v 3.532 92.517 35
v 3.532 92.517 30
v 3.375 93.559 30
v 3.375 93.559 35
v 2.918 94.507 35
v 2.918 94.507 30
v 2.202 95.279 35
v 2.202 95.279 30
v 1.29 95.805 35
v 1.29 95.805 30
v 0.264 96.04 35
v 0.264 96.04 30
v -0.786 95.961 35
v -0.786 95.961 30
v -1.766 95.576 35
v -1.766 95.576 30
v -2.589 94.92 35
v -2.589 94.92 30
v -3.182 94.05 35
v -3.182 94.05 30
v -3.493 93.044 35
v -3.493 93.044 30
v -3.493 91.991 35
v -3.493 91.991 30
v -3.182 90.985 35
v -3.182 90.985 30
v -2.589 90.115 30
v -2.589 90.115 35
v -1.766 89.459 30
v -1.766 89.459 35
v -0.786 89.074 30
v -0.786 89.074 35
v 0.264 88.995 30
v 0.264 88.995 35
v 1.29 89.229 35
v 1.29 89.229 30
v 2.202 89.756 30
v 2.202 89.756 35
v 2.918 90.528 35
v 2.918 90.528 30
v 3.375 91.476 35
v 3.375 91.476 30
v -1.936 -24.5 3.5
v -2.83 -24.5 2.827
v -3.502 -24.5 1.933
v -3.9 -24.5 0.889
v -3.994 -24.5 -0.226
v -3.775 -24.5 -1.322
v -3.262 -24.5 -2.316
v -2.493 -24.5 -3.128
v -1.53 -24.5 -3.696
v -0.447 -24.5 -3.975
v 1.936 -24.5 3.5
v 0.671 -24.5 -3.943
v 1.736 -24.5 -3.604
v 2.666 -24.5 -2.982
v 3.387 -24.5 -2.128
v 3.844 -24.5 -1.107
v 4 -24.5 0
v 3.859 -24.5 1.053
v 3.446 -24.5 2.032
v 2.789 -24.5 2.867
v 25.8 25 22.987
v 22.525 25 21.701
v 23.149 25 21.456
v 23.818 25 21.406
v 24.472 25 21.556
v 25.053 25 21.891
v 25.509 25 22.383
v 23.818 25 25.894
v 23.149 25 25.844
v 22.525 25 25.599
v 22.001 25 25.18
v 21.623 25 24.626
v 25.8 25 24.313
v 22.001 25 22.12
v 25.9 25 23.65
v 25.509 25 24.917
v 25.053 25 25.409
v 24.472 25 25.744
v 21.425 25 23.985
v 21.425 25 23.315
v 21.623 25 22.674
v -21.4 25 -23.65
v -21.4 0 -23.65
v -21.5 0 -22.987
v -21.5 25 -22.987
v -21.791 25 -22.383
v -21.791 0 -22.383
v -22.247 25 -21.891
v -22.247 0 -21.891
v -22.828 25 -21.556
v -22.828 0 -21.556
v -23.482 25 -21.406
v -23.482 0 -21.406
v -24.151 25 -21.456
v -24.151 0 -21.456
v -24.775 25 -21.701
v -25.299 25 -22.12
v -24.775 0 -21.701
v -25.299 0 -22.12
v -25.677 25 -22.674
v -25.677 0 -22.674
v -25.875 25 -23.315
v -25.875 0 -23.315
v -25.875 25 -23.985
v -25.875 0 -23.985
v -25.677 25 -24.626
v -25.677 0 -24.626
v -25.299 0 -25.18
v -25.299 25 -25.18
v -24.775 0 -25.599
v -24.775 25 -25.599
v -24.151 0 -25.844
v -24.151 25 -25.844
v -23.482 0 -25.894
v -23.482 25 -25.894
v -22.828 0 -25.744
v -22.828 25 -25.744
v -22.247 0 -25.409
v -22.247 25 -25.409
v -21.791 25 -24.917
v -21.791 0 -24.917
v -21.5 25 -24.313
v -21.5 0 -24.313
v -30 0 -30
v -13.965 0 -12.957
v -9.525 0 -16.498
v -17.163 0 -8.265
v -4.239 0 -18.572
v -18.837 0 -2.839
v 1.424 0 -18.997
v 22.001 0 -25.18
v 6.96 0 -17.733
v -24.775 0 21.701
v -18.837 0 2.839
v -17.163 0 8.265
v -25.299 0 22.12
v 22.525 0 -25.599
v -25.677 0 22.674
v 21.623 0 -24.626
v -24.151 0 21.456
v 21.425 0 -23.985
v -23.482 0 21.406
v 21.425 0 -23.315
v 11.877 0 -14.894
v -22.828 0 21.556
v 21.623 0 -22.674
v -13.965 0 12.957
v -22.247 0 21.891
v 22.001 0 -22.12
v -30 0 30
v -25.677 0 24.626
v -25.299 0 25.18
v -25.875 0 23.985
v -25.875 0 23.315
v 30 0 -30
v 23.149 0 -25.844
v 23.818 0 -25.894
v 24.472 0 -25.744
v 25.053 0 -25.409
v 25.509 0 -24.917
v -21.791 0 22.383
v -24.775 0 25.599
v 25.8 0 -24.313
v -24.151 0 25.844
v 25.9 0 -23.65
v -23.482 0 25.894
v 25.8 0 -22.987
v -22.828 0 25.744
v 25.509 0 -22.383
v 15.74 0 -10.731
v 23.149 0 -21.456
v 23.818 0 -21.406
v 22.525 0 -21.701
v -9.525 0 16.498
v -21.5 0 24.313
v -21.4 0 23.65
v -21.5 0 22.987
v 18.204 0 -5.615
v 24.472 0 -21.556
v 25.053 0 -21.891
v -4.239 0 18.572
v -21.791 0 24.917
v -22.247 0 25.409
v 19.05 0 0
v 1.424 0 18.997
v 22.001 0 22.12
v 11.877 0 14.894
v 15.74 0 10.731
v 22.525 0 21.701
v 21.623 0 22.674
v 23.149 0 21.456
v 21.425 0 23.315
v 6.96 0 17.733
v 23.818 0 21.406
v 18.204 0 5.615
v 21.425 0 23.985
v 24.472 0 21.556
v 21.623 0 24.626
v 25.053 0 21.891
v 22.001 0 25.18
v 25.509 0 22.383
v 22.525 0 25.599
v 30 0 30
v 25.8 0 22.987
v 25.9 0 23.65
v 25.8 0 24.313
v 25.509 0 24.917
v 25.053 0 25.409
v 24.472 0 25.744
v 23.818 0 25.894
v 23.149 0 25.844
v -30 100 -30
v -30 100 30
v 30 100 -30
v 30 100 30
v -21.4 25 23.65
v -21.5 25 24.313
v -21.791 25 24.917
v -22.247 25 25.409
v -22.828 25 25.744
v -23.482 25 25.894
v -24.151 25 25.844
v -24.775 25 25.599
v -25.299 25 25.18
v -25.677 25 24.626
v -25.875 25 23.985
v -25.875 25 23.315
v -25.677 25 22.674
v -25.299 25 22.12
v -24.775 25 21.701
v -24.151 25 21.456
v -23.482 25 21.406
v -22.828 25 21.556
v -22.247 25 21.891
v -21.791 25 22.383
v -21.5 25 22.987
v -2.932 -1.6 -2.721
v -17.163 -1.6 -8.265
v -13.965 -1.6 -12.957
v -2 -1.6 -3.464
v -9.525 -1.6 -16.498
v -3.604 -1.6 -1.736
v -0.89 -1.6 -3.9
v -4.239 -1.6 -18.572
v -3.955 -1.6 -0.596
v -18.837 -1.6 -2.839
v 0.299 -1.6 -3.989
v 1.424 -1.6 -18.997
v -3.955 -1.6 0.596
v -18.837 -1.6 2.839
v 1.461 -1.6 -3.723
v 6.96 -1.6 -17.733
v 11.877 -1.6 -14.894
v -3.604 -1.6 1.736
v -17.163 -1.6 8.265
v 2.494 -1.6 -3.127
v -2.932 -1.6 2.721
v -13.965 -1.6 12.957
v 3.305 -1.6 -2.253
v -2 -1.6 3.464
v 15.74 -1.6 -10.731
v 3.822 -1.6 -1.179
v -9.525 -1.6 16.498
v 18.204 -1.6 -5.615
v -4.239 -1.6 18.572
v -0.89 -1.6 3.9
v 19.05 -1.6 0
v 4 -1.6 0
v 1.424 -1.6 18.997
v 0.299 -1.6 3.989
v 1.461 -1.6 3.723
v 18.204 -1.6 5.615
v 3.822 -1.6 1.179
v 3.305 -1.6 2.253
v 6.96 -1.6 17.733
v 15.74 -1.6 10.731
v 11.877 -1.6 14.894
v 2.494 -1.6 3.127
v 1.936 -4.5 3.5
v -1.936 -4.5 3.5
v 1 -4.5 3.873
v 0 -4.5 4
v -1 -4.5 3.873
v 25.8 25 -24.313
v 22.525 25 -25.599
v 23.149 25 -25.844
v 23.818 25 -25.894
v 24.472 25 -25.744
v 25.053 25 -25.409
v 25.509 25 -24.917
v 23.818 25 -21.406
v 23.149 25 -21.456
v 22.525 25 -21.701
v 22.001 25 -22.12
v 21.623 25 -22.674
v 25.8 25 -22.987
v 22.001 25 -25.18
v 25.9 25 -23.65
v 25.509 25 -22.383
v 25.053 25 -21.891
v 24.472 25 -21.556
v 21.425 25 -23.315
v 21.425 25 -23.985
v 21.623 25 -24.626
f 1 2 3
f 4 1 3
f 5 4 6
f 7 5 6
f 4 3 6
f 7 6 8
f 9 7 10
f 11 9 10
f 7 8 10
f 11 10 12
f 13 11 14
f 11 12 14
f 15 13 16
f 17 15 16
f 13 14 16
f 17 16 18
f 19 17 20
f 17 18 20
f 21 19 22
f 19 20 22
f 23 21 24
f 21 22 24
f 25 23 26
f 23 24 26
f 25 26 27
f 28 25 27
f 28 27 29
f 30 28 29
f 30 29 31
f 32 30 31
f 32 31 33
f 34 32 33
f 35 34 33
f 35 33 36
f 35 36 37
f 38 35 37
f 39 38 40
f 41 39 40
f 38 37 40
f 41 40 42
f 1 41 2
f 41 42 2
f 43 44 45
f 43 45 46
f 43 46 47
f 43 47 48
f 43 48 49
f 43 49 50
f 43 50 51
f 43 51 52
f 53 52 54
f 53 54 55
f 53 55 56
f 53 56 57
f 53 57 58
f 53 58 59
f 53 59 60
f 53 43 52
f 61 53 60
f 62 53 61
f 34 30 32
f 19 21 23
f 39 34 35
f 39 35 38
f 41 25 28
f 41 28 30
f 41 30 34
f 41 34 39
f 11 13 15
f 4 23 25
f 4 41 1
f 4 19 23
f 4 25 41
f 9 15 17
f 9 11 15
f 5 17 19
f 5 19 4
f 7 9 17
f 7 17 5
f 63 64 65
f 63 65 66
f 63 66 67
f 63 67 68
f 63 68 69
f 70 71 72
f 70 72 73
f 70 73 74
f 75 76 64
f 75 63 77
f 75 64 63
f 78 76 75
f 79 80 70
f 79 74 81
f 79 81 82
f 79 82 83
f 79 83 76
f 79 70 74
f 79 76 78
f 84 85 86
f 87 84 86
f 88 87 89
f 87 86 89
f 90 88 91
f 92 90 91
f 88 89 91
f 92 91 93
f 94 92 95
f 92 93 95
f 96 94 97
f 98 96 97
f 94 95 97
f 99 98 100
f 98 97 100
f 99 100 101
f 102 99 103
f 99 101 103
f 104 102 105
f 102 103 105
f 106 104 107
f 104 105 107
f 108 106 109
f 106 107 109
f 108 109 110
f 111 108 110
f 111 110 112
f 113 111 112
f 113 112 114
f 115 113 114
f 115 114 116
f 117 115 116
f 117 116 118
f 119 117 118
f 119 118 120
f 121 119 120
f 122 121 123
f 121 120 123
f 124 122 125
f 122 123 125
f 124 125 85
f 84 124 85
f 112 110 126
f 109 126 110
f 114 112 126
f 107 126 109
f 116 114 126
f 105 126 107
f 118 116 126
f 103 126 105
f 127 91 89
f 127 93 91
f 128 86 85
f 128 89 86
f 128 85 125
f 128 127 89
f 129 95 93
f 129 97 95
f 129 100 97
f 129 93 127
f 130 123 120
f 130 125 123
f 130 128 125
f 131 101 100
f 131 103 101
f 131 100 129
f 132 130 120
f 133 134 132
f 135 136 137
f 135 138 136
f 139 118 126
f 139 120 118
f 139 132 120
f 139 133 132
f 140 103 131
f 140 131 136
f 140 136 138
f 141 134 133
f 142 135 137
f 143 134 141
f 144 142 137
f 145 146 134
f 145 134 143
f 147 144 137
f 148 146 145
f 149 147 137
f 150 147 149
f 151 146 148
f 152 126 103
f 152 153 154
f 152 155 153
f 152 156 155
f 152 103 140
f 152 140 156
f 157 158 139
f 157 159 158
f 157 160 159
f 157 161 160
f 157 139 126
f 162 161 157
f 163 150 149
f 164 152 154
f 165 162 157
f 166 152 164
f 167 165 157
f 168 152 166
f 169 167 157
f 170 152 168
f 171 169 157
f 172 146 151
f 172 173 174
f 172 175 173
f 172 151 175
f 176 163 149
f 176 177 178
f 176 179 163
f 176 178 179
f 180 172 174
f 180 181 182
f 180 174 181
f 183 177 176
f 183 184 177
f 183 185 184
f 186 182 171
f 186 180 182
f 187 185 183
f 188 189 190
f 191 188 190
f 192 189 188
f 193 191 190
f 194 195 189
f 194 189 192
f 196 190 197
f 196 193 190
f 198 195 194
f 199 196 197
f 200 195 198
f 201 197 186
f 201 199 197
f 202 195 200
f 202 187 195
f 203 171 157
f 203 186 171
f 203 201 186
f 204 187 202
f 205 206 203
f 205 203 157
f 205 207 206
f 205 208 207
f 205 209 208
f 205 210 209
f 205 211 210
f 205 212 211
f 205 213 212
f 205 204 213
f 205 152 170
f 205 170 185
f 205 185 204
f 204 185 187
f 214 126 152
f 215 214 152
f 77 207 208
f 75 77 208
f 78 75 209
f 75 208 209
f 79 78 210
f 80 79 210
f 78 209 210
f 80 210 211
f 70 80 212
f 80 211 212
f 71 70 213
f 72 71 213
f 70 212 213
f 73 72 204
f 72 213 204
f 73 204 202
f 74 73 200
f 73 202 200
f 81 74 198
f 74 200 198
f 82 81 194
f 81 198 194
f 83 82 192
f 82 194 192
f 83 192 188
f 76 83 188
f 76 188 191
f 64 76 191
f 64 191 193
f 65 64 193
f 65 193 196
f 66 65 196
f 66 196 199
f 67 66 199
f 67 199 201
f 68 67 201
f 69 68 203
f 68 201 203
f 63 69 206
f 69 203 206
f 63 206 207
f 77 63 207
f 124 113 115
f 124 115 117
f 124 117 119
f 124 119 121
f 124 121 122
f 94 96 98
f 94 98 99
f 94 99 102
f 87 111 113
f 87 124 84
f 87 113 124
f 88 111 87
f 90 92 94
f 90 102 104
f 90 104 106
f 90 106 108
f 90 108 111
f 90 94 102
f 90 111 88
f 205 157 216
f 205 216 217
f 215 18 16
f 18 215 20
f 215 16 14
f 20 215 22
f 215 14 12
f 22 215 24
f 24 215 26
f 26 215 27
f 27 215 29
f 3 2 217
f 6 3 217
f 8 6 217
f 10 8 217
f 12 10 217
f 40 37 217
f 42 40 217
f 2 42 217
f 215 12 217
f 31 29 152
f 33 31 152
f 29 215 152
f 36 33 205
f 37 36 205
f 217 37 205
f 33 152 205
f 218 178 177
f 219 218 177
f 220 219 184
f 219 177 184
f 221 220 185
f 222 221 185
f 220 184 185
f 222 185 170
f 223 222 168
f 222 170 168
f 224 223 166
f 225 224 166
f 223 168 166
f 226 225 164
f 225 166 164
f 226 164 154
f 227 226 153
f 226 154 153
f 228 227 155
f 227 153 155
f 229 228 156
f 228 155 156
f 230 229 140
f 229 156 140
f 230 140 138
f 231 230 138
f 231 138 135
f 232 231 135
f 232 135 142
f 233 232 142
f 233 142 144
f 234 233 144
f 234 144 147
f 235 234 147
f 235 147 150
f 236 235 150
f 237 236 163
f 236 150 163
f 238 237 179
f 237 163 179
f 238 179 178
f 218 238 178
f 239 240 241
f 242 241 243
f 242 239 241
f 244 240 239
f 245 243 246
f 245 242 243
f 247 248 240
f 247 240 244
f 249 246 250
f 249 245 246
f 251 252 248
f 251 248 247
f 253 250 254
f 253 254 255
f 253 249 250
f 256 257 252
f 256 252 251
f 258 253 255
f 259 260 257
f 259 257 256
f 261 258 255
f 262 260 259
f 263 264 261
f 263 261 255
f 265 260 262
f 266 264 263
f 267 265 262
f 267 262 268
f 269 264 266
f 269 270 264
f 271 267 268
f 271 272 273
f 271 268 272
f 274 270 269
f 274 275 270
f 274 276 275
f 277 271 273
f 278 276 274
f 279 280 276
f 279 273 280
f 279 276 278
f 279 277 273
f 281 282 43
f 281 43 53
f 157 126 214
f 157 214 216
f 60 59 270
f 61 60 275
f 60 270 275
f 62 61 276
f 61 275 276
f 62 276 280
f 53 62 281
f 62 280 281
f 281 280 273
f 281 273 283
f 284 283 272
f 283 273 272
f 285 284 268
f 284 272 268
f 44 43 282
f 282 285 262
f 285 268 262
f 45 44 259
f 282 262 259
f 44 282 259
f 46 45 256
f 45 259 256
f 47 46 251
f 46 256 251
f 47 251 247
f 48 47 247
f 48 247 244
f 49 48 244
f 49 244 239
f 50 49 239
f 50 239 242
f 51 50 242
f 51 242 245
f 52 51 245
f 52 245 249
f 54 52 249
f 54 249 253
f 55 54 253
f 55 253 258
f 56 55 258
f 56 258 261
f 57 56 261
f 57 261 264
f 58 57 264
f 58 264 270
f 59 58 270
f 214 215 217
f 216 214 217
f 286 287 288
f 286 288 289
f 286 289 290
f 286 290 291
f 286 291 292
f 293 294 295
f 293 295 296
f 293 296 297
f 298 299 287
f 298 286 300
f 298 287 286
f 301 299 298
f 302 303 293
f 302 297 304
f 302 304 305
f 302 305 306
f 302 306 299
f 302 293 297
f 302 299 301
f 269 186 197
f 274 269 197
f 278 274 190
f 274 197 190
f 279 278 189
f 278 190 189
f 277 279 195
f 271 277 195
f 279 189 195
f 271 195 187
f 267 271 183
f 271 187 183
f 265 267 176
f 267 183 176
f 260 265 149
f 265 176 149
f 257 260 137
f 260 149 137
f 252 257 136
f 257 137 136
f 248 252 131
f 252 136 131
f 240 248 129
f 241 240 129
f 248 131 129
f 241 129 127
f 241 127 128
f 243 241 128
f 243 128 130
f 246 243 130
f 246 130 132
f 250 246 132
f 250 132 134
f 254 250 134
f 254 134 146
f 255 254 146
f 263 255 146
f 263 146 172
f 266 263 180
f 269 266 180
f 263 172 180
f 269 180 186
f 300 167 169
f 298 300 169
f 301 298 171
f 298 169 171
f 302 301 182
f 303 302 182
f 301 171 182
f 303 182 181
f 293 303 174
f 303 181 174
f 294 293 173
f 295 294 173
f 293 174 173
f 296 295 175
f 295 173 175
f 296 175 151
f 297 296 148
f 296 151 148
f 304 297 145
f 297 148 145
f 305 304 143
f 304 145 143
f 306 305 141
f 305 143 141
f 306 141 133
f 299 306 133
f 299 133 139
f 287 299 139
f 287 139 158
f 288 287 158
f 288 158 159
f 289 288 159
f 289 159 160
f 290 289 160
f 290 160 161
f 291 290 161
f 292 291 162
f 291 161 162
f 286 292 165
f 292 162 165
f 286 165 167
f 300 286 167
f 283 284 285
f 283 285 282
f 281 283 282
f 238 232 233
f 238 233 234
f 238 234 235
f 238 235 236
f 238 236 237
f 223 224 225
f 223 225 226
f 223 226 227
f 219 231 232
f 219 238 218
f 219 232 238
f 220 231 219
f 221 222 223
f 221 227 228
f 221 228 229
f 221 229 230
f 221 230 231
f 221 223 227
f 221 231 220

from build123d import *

# Parameters (mm, degrees)
F0_W     = 60
F0_H     = 60
F0_R     = 2.25
F0_R_2   = 19.05
F0_R_3   = 4
F1_DEPTH = 100
F2_DEPTH = 24.5
F4_DEPTH = 20
F5_DEPTH = 1.6
F6_DEPTH = 25
F7_R     = 3.5321510556
F8_DEPTH = 5


with BuildPart() as f1:
    # F0 (on Front) → F1 (new body)
    with BuildSketch(Plane.XZ):
        Rectangle(F0_W, F0_H)
        with Locations((-23.65, -23.65)):
            Circle(F0_R, mode=Mode.SUBTRACT)
        with Locations((23.65, -23.65)):
            Circle(F0_R, mode=Mode.SUBTRACT)
        with Locations((-23.65, 23.65)):
            Circle(F0_R, mode=Mode.SUBTRACT)
        Circle(F0_R_2, mode=Mode.SUBTRACT)
        with Locations((23.65, 23.65)):
            Circle(F0_R, mode=Mode.SUBTRACT)
        Circle(F0_R_2)
        Circle(F0_R_3, mode=Mode.SUBTRACT)
        Circle(F0_R_3)
        with Locations((-23.65, 23.65)):
            Circle(F0_R)
        with Locations((23.65, 23.65)):
            Circle(F0_R)
        with Locations((23.65, -23.65)):
            Circle(F0_R)
        with Locations((-23.65, -23.65)):
            Circle(F0_R)
    extrude(amount=-F1_DEPTH)

    # F0 (on Front) → F2 (join)
    with BuildSketch(Plane.XZ):
        Circle(F0_R_3)
    extrude(amount=F2_DEPTH)

    # F3 (on face) → F4 (cut)
    with BuildSketch(Plane.XZ.offset(24.5)):
        with BuildLine():
            ThreePointArc((1.9364916731, 3.5), (0, 4), (-1.9364916731, 3.5))
            Line((-1.9364916731, 3.5), (1.9364916731, 3.5))
        make_face()
    extrude(amount=-F4_DEPTH, mode=Mode.SUBTRACT)

    # F0 (on Front) → F5 (join)
    with BuildSketch(Plane.XZ):
        Circle(F0_R_2)
        Circle(F0_R_3, mode=Mode.SUBTRACT)
    extrude(amount=F5_DEPTH)

    # F0 (on Front) → F6 (cut)
    with BuildSketch(Plane.XZ):
        with Locations((-23.65, 23.65)):
            Circle(F0_R)
        with Locations((23.65, 23.65)):
            Circle(F0_R)
        with Locations((23.65, -23.65)):
            Circle(F0_R)
        with Locations((-23.65, -23.65)):
            Circle(F0_R)
    extrude(amount=-F6_DEPTH, mode=Mode.SUBTRACT)

    # F7 (on face) → F8 (join)
    with BuildSketch(Plane.XY.offset(30)):
        with Locations((0, 92.517465353)):
            Circle(F7_R)
    extrude(amount=F8_DEPTH)


solid = f1.part
